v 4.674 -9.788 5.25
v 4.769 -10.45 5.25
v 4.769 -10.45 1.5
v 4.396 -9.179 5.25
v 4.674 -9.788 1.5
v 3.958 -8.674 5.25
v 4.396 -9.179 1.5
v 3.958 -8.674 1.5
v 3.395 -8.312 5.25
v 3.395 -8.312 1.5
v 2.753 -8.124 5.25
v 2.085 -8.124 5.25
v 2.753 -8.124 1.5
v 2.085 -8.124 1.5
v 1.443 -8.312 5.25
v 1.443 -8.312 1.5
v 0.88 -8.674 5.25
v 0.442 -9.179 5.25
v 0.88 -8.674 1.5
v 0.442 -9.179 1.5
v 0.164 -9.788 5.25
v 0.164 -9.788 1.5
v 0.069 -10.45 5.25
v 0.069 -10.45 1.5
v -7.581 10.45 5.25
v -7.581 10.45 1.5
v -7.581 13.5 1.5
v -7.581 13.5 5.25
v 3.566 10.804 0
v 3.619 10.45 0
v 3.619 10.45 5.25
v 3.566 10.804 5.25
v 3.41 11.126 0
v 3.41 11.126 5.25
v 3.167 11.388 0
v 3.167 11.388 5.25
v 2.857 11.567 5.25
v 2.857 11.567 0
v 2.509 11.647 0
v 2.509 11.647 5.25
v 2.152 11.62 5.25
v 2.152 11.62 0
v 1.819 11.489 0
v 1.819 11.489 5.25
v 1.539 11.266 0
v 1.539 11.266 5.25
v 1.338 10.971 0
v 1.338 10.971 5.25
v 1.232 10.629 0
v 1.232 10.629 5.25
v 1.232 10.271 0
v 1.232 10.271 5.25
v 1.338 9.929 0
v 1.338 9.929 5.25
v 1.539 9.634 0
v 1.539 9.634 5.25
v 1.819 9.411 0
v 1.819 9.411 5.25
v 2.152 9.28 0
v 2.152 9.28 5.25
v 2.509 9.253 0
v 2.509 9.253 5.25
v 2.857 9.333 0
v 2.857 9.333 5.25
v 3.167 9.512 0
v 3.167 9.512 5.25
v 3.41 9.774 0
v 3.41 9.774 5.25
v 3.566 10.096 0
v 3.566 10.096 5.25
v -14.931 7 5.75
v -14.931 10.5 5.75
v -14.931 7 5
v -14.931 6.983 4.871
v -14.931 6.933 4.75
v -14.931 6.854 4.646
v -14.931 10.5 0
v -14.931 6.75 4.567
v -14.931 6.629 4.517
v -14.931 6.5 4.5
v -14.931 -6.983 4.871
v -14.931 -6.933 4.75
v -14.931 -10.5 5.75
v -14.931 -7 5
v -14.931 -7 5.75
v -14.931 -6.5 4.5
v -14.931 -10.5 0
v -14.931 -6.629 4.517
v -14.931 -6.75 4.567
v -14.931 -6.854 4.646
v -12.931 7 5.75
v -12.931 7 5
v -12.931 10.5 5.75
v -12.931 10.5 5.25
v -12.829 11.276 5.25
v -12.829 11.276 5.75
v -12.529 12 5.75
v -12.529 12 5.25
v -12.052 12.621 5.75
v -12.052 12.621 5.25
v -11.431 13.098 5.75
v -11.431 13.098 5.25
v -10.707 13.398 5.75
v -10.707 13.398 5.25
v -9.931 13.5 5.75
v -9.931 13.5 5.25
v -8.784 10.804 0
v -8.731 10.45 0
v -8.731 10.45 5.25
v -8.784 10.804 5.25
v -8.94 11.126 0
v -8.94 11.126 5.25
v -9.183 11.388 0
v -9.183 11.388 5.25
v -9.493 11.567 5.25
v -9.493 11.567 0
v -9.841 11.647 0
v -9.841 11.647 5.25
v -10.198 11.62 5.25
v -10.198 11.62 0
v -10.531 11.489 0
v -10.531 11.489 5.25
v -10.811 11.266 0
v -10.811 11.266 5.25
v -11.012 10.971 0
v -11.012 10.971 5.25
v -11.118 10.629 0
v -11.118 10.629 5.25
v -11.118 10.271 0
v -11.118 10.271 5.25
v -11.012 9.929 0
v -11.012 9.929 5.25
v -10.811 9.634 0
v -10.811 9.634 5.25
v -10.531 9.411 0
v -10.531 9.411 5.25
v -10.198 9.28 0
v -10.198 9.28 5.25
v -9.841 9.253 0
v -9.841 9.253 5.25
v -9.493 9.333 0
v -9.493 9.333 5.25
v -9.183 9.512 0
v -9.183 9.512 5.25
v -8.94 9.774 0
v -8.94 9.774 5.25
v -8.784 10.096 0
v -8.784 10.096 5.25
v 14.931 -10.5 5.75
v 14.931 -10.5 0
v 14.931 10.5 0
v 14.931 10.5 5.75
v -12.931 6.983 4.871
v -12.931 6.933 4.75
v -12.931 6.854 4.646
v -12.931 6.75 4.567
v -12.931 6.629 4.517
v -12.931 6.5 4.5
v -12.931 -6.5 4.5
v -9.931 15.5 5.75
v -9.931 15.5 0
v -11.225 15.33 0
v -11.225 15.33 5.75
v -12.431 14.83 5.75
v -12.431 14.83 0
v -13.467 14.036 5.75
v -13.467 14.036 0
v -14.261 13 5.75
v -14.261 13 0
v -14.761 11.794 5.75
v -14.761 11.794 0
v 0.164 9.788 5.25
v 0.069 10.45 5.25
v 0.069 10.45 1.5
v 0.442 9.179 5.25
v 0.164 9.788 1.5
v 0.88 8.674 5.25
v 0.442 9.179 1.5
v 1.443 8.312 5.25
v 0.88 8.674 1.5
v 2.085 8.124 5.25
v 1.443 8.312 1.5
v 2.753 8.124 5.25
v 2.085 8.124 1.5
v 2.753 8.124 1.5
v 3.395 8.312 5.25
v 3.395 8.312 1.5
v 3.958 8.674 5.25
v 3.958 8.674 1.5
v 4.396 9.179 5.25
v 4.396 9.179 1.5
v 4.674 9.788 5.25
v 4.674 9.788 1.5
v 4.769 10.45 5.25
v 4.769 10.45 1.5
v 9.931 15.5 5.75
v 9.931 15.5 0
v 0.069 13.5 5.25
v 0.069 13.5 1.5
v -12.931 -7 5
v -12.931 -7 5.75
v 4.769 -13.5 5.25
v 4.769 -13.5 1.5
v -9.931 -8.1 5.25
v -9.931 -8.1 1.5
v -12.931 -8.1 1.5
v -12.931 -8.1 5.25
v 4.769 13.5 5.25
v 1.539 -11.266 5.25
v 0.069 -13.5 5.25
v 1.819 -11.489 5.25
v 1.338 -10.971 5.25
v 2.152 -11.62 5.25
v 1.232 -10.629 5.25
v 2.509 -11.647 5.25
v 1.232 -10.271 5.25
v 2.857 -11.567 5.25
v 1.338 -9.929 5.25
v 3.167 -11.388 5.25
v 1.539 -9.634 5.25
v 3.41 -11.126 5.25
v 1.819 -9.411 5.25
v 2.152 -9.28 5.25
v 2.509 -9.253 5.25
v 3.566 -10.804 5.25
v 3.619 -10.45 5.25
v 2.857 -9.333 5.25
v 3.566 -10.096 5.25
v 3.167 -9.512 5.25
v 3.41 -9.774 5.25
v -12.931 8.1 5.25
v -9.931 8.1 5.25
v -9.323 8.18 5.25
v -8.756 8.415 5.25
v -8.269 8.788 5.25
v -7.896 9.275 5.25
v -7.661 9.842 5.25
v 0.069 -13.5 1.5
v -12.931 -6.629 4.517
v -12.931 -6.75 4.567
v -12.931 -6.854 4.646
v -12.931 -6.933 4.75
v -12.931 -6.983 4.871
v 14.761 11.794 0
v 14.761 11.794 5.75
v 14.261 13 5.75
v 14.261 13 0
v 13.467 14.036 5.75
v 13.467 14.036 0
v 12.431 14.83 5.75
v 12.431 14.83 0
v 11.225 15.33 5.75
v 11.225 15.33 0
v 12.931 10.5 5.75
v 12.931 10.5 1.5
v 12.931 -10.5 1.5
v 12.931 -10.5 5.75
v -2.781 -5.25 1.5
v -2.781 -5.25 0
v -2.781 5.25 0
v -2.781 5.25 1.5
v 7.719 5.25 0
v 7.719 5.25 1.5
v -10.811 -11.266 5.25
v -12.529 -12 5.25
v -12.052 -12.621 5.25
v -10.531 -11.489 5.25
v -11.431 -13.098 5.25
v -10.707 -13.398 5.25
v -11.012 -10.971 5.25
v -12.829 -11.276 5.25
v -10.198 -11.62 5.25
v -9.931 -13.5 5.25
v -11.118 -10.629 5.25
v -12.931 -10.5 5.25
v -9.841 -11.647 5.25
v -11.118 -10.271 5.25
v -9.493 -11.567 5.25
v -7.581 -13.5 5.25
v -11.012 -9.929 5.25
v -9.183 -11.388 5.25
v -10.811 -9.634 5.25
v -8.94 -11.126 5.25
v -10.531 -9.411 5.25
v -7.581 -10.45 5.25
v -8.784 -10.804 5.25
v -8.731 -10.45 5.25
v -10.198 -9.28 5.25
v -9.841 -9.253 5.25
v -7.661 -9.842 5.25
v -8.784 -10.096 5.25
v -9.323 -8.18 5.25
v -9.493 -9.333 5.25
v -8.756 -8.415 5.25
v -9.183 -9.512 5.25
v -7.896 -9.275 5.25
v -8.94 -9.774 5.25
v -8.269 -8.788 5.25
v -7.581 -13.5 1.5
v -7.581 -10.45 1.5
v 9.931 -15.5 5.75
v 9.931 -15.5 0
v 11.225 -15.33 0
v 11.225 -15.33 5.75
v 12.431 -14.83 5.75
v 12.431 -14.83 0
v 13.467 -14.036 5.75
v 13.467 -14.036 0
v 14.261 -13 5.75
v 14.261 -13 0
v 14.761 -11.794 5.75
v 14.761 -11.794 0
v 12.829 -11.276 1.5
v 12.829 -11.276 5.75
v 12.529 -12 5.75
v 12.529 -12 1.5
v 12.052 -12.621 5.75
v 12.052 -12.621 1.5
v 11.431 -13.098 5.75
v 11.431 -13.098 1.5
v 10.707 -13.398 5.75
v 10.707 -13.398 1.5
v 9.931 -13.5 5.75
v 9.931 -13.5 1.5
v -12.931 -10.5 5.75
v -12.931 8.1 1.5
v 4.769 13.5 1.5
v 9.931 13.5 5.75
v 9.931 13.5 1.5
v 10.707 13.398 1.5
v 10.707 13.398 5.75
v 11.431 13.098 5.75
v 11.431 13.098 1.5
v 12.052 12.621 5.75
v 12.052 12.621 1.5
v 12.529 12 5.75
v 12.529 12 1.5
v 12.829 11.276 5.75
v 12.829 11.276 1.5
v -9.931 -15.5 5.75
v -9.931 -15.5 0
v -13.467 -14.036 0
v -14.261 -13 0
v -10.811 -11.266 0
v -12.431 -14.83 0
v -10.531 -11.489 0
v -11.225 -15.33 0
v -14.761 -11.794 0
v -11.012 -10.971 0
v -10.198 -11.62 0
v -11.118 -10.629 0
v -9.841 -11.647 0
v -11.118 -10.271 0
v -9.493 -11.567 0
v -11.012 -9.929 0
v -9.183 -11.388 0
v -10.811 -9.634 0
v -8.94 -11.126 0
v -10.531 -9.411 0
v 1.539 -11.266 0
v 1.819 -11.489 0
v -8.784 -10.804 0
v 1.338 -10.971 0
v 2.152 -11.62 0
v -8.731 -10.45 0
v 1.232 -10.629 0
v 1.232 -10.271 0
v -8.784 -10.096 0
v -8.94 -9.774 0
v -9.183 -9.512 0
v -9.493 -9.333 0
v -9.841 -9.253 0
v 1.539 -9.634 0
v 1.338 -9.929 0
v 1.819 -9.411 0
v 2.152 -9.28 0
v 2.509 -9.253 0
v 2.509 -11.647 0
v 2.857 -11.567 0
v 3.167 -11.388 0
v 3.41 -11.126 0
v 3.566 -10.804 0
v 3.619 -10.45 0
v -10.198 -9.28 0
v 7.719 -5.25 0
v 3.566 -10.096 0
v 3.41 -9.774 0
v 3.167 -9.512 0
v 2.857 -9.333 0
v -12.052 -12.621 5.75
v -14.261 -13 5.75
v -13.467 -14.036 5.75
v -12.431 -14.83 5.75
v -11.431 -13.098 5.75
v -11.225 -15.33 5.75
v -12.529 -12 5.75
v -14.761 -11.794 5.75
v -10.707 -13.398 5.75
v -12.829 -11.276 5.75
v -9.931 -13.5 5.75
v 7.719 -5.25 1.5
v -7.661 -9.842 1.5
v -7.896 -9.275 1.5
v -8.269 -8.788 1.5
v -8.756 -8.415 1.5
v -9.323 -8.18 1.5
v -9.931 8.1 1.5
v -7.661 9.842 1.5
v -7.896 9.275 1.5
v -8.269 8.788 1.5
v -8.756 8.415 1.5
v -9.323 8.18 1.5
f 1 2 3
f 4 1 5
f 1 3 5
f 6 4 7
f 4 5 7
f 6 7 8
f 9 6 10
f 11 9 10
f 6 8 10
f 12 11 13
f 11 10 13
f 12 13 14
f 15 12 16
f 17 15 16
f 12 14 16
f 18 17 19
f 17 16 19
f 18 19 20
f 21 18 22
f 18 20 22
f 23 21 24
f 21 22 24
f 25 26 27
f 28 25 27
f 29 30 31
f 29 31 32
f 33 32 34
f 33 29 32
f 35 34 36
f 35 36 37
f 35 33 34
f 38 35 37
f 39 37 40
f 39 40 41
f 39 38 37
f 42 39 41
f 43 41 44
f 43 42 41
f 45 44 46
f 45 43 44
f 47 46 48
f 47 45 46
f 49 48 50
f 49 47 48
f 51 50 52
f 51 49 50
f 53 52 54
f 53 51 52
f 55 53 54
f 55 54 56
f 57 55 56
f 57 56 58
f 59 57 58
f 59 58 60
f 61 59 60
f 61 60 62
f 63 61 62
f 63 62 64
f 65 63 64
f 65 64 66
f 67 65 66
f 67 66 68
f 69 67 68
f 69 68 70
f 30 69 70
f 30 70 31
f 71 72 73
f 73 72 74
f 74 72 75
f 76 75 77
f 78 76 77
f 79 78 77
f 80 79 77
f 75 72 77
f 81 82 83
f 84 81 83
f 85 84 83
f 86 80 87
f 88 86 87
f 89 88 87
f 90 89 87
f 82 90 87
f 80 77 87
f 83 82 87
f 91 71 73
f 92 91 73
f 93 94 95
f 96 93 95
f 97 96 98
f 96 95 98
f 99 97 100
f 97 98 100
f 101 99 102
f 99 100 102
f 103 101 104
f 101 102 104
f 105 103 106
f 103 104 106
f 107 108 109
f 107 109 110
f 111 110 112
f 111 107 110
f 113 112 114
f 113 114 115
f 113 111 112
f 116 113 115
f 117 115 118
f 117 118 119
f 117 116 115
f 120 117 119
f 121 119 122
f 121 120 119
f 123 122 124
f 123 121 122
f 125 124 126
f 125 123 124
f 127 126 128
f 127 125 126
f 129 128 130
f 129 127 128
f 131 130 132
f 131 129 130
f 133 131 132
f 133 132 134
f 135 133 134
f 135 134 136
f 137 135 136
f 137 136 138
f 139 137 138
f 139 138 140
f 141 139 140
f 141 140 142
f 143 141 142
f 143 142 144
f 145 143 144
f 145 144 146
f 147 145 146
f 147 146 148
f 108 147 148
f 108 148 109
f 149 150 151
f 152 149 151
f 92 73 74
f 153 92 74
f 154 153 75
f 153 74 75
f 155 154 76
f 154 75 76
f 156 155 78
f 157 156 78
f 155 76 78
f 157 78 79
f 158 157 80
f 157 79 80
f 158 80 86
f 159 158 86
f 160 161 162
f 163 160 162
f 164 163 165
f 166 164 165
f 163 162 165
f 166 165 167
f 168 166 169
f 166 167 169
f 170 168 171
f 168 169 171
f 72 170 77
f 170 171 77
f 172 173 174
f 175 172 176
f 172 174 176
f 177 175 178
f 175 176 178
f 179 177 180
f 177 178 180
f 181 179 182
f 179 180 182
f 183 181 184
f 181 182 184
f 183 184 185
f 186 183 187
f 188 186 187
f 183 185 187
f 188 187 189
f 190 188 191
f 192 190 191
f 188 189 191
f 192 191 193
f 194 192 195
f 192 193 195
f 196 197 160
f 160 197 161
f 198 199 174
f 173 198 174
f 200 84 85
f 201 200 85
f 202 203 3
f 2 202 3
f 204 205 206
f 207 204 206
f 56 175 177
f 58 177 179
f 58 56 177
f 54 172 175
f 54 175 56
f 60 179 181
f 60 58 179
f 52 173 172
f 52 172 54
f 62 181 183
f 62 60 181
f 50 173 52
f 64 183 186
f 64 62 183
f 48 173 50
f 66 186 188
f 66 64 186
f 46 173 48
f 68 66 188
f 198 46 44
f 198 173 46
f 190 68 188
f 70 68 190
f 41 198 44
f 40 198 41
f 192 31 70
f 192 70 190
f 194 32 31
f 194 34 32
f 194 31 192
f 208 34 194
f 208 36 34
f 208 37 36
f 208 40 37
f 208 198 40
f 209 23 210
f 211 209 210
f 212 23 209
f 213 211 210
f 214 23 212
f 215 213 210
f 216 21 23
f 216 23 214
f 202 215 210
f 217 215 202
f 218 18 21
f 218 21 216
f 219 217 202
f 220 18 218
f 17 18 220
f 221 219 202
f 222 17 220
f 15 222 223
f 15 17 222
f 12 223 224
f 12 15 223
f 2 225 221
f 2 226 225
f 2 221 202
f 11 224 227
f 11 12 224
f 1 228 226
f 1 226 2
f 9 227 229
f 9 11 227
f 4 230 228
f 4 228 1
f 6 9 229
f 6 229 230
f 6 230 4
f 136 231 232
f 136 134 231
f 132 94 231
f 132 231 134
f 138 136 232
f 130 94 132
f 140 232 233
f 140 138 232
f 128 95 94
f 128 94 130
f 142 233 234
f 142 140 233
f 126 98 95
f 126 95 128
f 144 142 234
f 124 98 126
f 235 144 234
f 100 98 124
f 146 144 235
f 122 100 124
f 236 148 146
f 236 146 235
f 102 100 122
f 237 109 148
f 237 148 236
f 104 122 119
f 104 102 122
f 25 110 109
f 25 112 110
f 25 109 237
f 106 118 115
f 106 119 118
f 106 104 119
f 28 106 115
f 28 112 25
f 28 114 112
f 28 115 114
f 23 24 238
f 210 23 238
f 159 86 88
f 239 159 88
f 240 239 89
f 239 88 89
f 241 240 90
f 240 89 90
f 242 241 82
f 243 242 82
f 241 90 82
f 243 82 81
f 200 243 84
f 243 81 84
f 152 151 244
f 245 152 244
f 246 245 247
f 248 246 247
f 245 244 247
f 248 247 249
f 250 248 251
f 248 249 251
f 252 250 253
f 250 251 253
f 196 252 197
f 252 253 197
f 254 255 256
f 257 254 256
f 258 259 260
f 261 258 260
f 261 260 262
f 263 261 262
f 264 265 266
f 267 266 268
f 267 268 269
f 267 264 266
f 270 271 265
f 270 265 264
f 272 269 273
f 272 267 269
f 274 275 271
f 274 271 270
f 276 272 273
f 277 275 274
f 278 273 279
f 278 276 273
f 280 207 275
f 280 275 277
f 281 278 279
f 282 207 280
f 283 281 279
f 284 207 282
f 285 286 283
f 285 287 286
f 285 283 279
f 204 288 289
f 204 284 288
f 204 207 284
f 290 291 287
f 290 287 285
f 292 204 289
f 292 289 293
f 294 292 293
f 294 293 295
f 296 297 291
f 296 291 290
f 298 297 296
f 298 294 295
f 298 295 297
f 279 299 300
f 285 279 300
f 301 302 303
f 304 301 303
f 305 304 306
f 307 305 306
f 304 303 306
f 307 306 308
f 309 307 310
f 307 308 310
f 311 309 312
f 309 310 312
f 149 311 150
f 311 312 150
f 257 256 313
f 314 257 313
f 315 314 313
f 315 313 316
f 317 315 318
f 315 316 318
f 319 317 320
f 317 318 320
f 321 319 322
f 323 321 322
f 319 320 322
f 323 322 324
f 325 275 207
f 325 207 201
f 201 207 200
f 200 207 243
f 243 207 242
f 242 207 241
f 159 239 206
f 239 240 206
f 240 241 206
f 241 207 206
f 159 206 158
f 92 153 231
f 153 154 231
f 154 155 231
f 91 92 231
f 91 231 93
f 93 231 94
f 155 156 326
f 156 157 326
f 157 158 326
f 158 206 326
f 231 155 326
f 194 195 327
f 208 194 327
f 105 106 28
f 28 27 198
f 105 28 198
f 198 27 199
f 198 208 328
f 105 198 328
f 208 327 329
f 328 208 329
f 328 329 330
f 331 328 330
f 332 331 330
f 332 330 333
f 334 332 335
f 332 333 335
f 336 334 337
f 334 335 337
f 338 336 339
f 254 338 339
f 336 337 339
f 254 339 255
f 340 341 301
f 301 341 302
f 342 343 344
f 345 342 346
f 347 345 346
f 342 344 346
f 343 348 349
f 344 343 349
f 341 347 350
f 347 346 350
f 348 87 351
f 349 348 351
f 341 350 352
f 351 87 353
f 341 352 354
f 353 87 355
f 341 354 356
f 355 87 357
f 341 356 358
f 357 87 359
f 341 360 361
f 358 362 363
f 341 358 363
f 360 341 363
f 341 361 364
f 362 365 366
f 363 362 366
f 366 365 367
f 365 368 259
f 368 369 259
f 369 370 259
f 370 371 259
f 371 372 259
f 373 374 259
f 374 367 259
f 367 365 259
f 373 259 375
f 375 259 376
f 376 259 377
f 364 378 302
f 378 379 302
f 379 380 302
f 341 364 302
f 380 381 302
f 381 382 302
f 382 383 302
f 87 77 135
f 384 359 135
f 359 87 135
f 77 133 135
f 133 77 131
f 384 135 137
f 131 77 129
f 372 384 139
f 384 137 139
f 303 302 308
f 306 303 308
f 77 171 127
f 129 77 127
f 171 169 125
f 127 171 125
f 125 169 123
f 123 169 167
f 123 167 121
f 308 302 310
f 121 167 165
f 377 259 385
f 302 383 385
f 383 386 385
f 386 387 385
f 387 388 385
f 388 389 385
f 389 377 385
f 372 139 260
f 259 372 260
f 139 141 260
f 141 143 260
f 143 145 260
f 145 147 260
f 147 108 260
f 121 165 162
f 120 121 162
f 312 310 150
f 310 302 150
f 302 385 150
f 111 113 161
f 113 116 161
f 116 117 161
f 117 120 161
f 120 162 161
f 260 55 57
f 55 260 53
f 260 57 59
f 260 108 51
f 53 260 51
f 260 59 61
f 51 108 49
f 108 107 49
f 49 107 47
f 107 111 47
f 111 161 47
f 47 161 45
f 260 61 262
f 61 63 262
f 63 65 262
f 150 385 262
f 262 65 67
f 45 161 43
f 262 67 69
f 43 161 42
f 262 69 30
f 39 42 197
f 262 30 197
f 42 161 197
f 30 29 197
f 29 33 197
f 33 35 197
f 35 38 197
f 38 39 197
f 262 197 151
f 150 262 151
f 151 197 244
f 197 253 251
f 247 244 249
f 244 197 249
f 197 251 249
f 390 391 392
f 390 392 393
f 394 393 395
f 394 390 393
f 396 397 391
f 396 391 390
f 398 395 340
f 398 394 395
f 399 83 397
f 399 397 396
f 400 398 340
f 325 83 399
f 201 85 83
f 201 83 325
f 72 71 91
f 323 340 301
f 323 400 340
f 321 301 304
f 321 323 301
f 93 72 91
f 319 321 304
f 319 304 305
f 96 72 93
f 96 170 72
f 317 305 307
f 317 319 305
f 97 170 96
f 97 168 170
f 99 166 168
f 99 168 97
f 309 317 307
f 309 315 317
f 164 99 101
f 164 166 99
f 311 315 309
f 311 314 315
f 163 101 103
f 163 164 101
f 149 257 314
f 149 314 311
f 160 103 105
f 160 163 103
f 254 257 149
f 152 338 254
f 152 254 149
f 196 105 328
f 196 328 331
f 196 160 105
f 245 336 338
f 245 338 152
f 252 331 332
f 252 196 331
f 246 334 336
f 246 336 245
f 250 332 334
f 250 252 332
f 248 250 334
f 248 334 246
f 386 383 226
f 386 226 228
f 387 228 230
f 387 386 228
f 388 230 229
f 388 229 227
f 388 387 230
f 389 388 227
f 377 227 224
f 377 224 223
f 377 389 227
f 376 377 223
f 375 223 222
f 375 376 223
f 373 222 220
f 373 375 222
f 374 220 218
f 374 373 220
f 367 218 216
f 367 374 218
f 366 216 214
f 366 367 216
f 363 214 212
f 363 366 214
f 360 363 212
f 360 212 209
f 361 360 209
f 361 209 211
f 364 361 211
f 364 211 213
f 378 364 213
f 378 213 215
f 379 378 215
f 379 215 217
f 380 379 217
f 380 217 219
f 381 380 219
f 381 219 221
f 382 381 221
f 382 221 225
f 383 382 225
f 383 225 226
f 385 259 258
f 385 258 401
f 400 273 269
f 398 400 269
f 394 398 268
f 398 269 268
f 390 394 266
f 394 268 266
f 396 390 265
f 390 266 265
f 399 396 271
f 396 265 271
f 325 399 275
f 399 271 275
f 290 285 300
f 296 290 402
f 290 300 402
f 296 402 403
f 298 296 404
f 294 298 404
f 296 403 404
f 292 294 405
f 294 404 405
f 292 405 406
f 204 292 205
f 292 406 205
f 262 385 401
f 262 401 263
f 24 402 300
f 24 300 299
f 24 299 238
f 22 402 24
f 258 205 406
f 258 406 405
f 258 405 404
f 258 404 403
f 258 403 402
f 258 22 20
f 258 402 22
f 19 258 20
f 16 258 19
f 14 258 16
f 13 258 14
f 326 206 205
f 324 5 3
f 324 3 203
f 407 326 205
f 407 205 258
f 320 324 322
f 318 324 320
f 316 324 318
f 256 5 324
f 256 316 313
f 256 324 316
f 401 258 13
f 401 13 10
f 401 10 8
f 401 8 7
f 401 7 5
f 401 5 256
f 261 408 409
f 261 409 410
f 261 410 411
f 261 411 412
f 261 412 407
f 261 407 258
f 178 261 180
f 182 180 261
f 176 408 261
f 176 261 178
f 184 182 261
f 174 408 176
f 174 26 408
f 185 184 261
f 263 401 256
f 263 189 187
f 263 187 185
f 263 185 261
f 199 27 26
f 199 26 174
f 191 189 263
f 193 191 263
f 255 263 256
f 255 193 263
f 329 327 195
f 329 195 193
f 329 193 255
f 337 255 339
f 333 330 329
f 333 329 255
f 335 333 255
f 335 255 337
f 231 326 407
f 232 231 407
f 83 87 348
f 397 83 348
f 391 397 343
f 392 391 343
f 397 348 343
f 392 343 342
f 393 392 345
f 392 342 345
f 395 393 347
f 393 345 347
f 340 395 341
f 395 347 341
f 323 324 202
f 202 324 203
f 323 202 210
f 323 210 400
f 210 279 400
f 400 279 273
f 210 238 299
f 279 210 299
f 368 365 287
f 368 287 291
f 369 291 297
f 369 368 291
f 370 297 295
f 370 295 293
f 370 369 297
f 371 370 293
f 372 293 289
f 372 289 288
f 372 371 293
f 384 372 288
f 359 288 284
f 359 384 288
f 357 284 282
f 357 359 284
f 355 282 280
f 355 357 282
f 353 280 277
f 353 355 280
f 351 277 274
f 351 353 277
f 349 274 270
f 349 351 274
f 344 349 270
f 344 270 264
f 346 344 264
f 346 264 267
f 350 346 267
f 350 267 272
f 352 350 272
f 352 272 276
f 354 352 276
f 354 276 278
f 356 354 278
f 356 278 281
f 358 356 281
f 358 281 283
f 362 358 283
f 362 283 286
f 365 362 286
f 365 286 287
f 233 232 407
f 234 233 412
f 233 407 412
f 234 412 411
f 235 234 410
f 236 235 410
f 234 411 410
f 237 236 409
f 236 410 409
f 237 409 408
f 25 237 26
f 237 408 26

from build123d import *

# Parameters (mm, degrees)
F0_R     = 1.2
F0_W     = 10.5
F0_H     = 10.5
F1_DEPTH = 1.5
F2_DEPTH = 5.25
F3_DEPTH = 5.75
F5_DEPTH = 2


# Not quite as in the source:
# - a feature names something its author has since deleted; it is built from what else it names


with BuildPart() as f1:
    # F0 (on Top) → F1 (new body)
    with BuildSketch(Plane.XY):
        with BuildLine():
            Line((14.9310000289, -10.5), (14.9310000289, 10.5))
            ThreePointArc((14.9310000289, 10.5), (13.4665339264, 14.0355339264), (9.931, 15.5000000289))
            Line((9.931, 15.5000000289), (-9.931, 15.5000000289))
            ThreePointArc((-9.931, 15.5000000289), (-13.4665339264, 14.0355339264), (-14.9310000289, 10.5))
            Line((-14.9310000289, 10.5), (-14.9310000289, -10.5))
            ThreePointArc((-14.9310000289, -10.5), (-13.4665339264, -14.0355339264), (-9.931, -15.5000000289))
            Line((-9.931, -15.5000000289), (9.931, -15.5000000289))
            ThreePointArc((9.931, -15.5000000289), (13.4665339264, -14.0355339264), (14.9310000289, -10.5))
        make_face()
        with BuildLine():
            Line((-9.931, 13.5000000289), (-7.581, 13.5000000289))
            Line((-7.581, 13.5000000289), (0.069, 13.5000000289))
            Line((0.069, 13.5000000289), (4.769, 13.5000000289))
            Line((4.769, 13.5000000289), (9.931, 13.5000000289))
            ThreePointArc((9.931, 13.5000000289), (12.052320364, 12.621320364), (12.9310000289, 10.5))
            Line((12.9310000289, 10.5), (12.9310000289, -10.5))
            ThreePointArc((12.9310000289, -10.5), (12.052320364, -12.621320364), (9.931, -13.5000000289))
            Line((9.931, -13.5000000289), (4.769, -13.5000000289))
            Line((4.769, -13.5000000289), (0.069, -13.5000000289))
            Line((0.069, -13.5000000289), (-7.581, -13.5000000289))
            Line((-7.581, -13.5000000289), (-9.931, -13.5000000289))
            ThreePointArc((-9.931, -13.5000000289), (-12.052320364, -12.621320364), (-12.9310000289, -10.5))
            Line((-12.9310000289, -10.5), (-12.9310000289, -8.1))
            Line((-12.9310000289, -8.1), (-12.9310000289, 8.1))
            Line((-12.9310000289, 8.1), (-12.9310000289, 10.5))
            ThreePointArc((-12.9310000289, 10.5), (-12.052320364, 12.621320364), (-9.931, 13.5000000289))
        make_face(mode=Mode.SUBTRACT)
        with BuildLine():
            ThreePointArc((4.769, -10.45), (2.419, -8.1), (0.069, -10.45))
            ThreePointArc((0.069, -10.45), (2.419, -12.8), (4.769, -10.45))
        make_face()
        with Locations((2.419, -10.45)):
            Circle(F0_R, mode=Mode.SUBTRACT)
        with BuildLine():
            ThreePointArc((4.769, 10.45), (2.419, 12.8), (0.069, 10.45))
            ThreePointArc((0.069, 10.45), (2.419, 8.1), (4.769, 10.45))
        make_face()
        with Locations((2.419, 10.45)):
            Circle(F0_R, mode=Mode.SUBTRACT)
        with BuildLine():
            ThreePointArc((-9.931, 8.1), (-11.5927009358, 12.1117009358), (-7.581, 10.45))
            Line((-7.581, 10.45), (-7.581, 13.5000000289))
            Line((-7.581, 13.5000000289), (-9.931, 13.5000000289))
            ThreePointArc((-9.931, 13.5000000289), (-12.052320364, 12.621320364), (-12.9310000289, 10.5))
            Line((-12.9310000289, 10.5), (-12.9310000289, 8.1))
            Line((-12.9310000289, 8.1), (-9.931, 8.1))
        make_face()
        with BuildLine():
            Line((-9.931, -8.1), (-12.9310000289, -8.1))
            Line((-12.9310000289, -8.1), (-12.9310000289, -10.5))
            ThreePointArc((-12.9310000289, -10.5), (-12.052320364, -12.621320364), (-9.931, -13.5000000289))
            Line((-9.931, -13.5000000289), (-7.581, -13.5000000289))
            Line((-7.581, -13.5000000289), (-7.581, -10.45))
            ThreePointArc((-7.581, -10.45), (-11.5927009358, -12.1117009358), (-9.931, -8.1))
        make_face()
        with BuildLine():
            Line((-7.581, 13.5000000289), (-7.581, 10.45))
            ThreePointArc((-7.581, 10.45), (-8.2692990642, 8.7882990642), (-9.931, 8.1))
            Line((-9.931, 8.1), (-12.9310000289, 8.1))
            Line((-12.9310000289, 8.1), (-12.9310000289, -8.1))
            Line((-12.9310000289, -8.1), (-9.931, -8.1))
            ThreePointArc((-9.931, -8.1), (-8.2692990642, -8.7882990642), (-7.581, -10.45))
            Line((-7.581, -10.45), (-7.581, -13.5000000289))
            Line((-7.581, -13.5000000289), (0.069, -13.5000000289))
            Line((0.069, -13.5000000289), (0.069, -10.45))
            ThreePointArc((0.069, -10.45), (2.419, -8.1), (4.769, -10.45))
            Line((4.769, -10.45), (4.769, -13.5000000289))
            Line((4.769, -13.5000000289), (9.931, -13.5000000289))
            ThreePointArc((9.931, -13.5000000289), (12.052320364, -12.621320364), (12.9310000289, -10.5))
            Line((12.9310000289, -10.5), (12.9310000289, 10.5))
            ThreePointArc((12.9310000289, 10.5), (12.052320364, 12.621320364), (9.931, 13.5000000289))
            Line((9.931, 13.5000000289), (4.769, 13.5000000289))
            Line((4.769, 13.5000000289), (4.769, 10.45))
            ThreePointArc((4.769, 10.45), (2.419, 8.1), (0.069, 10.45))
            Line((0.069, 10.45), (0.069, 13.5000000289))
            Line((0.069, 13.5000000289), (-7.581, 13.5000000289))
        make_face()
        with Locations((2.469, 0)):
            Rectangle(F0_W, F0_H, mode=Mode.SUBTRACT)
        with BuildLine():
            ThreePointArc((-7.581, -10.45), (-8.2692990642, -8.7882990642), (-9.931, -8.1))
            ThreePointArc((-9.931, -8.1), (-11.5927009358, -12.1117009358), (-7.581, -10.45))
        make_face()
        with Locations((-9.931, -10.45)):
            Circle(F0_R, mode=Mode.SUBTRACT)
        with BuildLine():
            Line((0.069, -10.45), (0.069, -13.5000000289))
            Line((0.069, -13.5000000289), (4.769, -13.5000000289))
            Line((4.769, -13.5000000289), (4.769, -10.45))
            ThreePointArc((4.769, -10.45), (2.419, -12.8), (0.069, -10.45))
        make_face()
        with BuildLine():
            ThreePointArc((-9.931, 8.1), (-8.2692990642, 8.7882990642), (-7.581, 10.45))
            ThreePointArc((-7.581, 10.45), (-11.5927009358, 12.1117009358), (-9.931, 8.1))
        make_face()
        with Locations((-9.931, 10.45)):
            Circle(F0_R, mode=Mode.SUBTRACT)
        with BuildLine():
            Line((4.769, 13.5000000289), (0.069, 13.5000000289))
            Line((0.069, 13.5000000289), (0.069, 10.45))
            ThreePointArc((0.069, 10.45), (2.419, 12.8), (4.769, 10.45))
            Line((4.769, 10.45), (4.769, 13.5000000289))
        make_face()
    extrude(amount=F1_DEPTH)

    # F0 (on Top) → F2 (join)
    with BuildSketch(Plane.XY):
        with BuildLine():
            ThreePointArc((-9.931, 8.1), (-11.5927009358, 12.1117009358), (-7.581, 10.45))
            Line((-7.581, 10.45), (-7.581, 13.5000000289))
            Line((-7.581, 13.5000000289), (-9.931, 13.5000000289))
            ThreePointArc((-9.931, 13.5000000289), (-12.052320364, 12.621320364), (-12.9310000289, 10.5))
            Line((-12.9310000289, 10.5), (-12.9310000289, 8.1))
            Line((-12.9310000289, 8.1), (-9.931, 8.1))
        make_face()
        with BuildLine():
            ThreePointArc((-9.931, 8.1), (-8.2692990642, 8.7882990642), (-7.581, 10.45))
            ThreePointArc((-7.581, 10.45), (-11.5927009358, 12.1117009358), (-9.931, 8.1))
        make_face()
        with Locations((-9.931, 10.45)):
            Circle(F0_R, mode=Mode.SUBTRACT)
        with BuildLine():
            ThreePointArc((4.769, 10.45), (2.419, 12.8), (0.069, 10.45))
            ThreePointArc((0.069, 10.45), (2.419, 8.1), (4.769, 10.45))
        make_face()
        with Locations((2.419, 10.45)):
            Circle(F0_R, mode=Mode.SUBTRACT)
        with BuildLine():
            Line((4.769, 13.5000000289), (0.069, 13.5000000289))
            Line((0.069, 13.5000000289), (0.069, 10.45))
            ThreePointArc((0.069, 10.45), (2.419, 12.8), (4.769, 10.45))
            Line((4.769, 10.45), (4.769, 13.5000000289))
        make_face()
        with BuildLine():
            ThreePointArc((4.769, -10.45), (2.419, -8.1), (0.069, -10.45))
            ThreePointArc((0.069, -10.45), (2.419, -12.8), (4.769, -10.45))
        make_face()
        with Locations((2.419, -10.45)):
            Circle(F0_R, mode=Mode.SUBTRACT)
        with BuildLine():
            Line((0.069, -10.45), (0.069, -13.5000000289))
            Line((0.069, -13.5000000289), (4.769, -13.5000000289))
            Line((4.769, -13.5000000289), (4.769, -10.45))
            ThreePointArc((4.769, -10.45), (2.419, -12.8), (0.069, -10.45))
        make_face()
        with BuildLine():
            ThreePointArc((-7.581, -10.45), (-8.2692990642, -8.7882990642), (-9.931, -8.1))
            ThreePointArc((-9.931, -8.1), (-11.5927009358, -12.1117009358), (-7.581, -10.45))
        make_face()
        with Locations((-9.931, -10.45)):
            Circle(F0_R, mode=Mode.SUBTRACT)
        with BuildLine():
            Line((-9.931, -8.1), (-12.9310000289, -8.1))
            Line((-12.9310000289, -8.1), (-12.9310000289, -10.5))
            ThreePointArc((-12.9310000289, -10.5), (-12.052320364, -12.621320364), (-9.931, -13.5000000289))
            Line((-9.931, -13.5000000289), (-7.581, -13.5000000289))
            Line((-7.581, -13.5000000289), (-7.581, -10.45))
            ThreePointArc((-7.581, -10.45), (-11.5927009358, -12.1117009358), (-9.931, -8.1))
        make_face()
    extrude(amount=F2_DEPTH)

    # F0 (on Top) → F3 (join)
    with BuildSketch(Plane.XY):
        with BuildLine():
            Line((14.9310000289, -10.5), (14.9310000289, 10.5))
            ThreePointArc((14.9310000289, 10.5), (13.4665339264, 14.0355339264), (9.931, 15.5000000289))
            Line((9.931, 15.5000000289), (-9.931, 15.5000000289))
            ThreePointArc((-9.931, 15.5000000289), (-13.4665339264, 14.0355339264), (-14.9310000289, 10.5))
            Line((-14.9310000289, 10.5), (-14.9310000289, -10.5))
            ThreePointArc((-14.9310000289, -10.5), (-13.4665339264, -14.0355339264), (-9.931, -15.5000000289))
            Line((-9.931, -15.5000000289), (9.931, -15.5000000289))
            ThreePointArc((9.931, -15.5000000289), (13.4665339264, -14.0355339264), (14.9310000289, -10.5))
        make_face()
        with BuildLine():
            Line((-9.931, 13.5000000289), (-7.581, 13.5000000289))
            Line((-7.581, 13.5000000289), (0.069, 13.5000000289))
            Line((0.069, 13.5000000289), (4.769, 13.5000000289))
            Line((4.769, 13.5000000289), (9.931, 13.5000000289))
            ThreePointArc((9.931, 13.5000000289), (12.052320364, 12.621320364), (12.9310000289, 10.5))
            Line((12.9310000289, 10.5), (12.9310000289, -10.5))
            ThreePointArc((12.9310000289, -10.5), (12.052320364, -12.621320364), (9.931, -13.5000000289))
            Line((9.931, -13.5000000289), (4.769, -13.5000000289))
            Line((4.769, -13.5000000289), (0.069, -13.5000000289))
            Line((0.069, -13.5000000289), (-7.581, -13.5000000289))
            Line((-7.581, -13.5000000289), (-9.931, -13.5000000289))
            ThreePointArc((-9.931, -13.5000000289), (-12.052320364, -12.621320364), (-12.9310000289, -10.5))
            Line((-12.9310000289, -10.5), (-12.9310000289, -8.1))
            Line((-12.9310000289, -8.1), (-12.9310000289, 8.1))
            Line((-12.9310000289, 8.1), (-12.9310000289, 10.5))
            ThreePointArc((-12.9310000289, 10.5), (-12.052320364, 12.621320364), (-9.931, 13.5000000289))
        make_face(mode=Mode.SUBTRACT)
    extrude(amount=F3_DEPTH)

    # F4 (on face) → F5 (cut)
    with BuildSketch(Plane(origin=(-14.9310000289, 0, 0), x_dir=(0, -1, 0), z_dir=(-1, 0, 0))):
        with BuildLine():
            Line((7, 5.75), (-7, 5.75))
            Line((-7, 5.75), (-7, 5))
            ThreePointArc((-7, 5), (-6.8535533906, 4.6464466094), (-6.5, 4.5))
            Line((-6.5, 4.5), (6.5, 4.5))
            ThreePointArc((6.5, 4.5), (6.8535533906, 4.6464466094), (7, 5))
            Line((7, 5), (7, 5.75))
        make_face()
    extrude(amount=-F5_DEPTH, mode=Mode.SUBTRACT)


solid = f1.part
